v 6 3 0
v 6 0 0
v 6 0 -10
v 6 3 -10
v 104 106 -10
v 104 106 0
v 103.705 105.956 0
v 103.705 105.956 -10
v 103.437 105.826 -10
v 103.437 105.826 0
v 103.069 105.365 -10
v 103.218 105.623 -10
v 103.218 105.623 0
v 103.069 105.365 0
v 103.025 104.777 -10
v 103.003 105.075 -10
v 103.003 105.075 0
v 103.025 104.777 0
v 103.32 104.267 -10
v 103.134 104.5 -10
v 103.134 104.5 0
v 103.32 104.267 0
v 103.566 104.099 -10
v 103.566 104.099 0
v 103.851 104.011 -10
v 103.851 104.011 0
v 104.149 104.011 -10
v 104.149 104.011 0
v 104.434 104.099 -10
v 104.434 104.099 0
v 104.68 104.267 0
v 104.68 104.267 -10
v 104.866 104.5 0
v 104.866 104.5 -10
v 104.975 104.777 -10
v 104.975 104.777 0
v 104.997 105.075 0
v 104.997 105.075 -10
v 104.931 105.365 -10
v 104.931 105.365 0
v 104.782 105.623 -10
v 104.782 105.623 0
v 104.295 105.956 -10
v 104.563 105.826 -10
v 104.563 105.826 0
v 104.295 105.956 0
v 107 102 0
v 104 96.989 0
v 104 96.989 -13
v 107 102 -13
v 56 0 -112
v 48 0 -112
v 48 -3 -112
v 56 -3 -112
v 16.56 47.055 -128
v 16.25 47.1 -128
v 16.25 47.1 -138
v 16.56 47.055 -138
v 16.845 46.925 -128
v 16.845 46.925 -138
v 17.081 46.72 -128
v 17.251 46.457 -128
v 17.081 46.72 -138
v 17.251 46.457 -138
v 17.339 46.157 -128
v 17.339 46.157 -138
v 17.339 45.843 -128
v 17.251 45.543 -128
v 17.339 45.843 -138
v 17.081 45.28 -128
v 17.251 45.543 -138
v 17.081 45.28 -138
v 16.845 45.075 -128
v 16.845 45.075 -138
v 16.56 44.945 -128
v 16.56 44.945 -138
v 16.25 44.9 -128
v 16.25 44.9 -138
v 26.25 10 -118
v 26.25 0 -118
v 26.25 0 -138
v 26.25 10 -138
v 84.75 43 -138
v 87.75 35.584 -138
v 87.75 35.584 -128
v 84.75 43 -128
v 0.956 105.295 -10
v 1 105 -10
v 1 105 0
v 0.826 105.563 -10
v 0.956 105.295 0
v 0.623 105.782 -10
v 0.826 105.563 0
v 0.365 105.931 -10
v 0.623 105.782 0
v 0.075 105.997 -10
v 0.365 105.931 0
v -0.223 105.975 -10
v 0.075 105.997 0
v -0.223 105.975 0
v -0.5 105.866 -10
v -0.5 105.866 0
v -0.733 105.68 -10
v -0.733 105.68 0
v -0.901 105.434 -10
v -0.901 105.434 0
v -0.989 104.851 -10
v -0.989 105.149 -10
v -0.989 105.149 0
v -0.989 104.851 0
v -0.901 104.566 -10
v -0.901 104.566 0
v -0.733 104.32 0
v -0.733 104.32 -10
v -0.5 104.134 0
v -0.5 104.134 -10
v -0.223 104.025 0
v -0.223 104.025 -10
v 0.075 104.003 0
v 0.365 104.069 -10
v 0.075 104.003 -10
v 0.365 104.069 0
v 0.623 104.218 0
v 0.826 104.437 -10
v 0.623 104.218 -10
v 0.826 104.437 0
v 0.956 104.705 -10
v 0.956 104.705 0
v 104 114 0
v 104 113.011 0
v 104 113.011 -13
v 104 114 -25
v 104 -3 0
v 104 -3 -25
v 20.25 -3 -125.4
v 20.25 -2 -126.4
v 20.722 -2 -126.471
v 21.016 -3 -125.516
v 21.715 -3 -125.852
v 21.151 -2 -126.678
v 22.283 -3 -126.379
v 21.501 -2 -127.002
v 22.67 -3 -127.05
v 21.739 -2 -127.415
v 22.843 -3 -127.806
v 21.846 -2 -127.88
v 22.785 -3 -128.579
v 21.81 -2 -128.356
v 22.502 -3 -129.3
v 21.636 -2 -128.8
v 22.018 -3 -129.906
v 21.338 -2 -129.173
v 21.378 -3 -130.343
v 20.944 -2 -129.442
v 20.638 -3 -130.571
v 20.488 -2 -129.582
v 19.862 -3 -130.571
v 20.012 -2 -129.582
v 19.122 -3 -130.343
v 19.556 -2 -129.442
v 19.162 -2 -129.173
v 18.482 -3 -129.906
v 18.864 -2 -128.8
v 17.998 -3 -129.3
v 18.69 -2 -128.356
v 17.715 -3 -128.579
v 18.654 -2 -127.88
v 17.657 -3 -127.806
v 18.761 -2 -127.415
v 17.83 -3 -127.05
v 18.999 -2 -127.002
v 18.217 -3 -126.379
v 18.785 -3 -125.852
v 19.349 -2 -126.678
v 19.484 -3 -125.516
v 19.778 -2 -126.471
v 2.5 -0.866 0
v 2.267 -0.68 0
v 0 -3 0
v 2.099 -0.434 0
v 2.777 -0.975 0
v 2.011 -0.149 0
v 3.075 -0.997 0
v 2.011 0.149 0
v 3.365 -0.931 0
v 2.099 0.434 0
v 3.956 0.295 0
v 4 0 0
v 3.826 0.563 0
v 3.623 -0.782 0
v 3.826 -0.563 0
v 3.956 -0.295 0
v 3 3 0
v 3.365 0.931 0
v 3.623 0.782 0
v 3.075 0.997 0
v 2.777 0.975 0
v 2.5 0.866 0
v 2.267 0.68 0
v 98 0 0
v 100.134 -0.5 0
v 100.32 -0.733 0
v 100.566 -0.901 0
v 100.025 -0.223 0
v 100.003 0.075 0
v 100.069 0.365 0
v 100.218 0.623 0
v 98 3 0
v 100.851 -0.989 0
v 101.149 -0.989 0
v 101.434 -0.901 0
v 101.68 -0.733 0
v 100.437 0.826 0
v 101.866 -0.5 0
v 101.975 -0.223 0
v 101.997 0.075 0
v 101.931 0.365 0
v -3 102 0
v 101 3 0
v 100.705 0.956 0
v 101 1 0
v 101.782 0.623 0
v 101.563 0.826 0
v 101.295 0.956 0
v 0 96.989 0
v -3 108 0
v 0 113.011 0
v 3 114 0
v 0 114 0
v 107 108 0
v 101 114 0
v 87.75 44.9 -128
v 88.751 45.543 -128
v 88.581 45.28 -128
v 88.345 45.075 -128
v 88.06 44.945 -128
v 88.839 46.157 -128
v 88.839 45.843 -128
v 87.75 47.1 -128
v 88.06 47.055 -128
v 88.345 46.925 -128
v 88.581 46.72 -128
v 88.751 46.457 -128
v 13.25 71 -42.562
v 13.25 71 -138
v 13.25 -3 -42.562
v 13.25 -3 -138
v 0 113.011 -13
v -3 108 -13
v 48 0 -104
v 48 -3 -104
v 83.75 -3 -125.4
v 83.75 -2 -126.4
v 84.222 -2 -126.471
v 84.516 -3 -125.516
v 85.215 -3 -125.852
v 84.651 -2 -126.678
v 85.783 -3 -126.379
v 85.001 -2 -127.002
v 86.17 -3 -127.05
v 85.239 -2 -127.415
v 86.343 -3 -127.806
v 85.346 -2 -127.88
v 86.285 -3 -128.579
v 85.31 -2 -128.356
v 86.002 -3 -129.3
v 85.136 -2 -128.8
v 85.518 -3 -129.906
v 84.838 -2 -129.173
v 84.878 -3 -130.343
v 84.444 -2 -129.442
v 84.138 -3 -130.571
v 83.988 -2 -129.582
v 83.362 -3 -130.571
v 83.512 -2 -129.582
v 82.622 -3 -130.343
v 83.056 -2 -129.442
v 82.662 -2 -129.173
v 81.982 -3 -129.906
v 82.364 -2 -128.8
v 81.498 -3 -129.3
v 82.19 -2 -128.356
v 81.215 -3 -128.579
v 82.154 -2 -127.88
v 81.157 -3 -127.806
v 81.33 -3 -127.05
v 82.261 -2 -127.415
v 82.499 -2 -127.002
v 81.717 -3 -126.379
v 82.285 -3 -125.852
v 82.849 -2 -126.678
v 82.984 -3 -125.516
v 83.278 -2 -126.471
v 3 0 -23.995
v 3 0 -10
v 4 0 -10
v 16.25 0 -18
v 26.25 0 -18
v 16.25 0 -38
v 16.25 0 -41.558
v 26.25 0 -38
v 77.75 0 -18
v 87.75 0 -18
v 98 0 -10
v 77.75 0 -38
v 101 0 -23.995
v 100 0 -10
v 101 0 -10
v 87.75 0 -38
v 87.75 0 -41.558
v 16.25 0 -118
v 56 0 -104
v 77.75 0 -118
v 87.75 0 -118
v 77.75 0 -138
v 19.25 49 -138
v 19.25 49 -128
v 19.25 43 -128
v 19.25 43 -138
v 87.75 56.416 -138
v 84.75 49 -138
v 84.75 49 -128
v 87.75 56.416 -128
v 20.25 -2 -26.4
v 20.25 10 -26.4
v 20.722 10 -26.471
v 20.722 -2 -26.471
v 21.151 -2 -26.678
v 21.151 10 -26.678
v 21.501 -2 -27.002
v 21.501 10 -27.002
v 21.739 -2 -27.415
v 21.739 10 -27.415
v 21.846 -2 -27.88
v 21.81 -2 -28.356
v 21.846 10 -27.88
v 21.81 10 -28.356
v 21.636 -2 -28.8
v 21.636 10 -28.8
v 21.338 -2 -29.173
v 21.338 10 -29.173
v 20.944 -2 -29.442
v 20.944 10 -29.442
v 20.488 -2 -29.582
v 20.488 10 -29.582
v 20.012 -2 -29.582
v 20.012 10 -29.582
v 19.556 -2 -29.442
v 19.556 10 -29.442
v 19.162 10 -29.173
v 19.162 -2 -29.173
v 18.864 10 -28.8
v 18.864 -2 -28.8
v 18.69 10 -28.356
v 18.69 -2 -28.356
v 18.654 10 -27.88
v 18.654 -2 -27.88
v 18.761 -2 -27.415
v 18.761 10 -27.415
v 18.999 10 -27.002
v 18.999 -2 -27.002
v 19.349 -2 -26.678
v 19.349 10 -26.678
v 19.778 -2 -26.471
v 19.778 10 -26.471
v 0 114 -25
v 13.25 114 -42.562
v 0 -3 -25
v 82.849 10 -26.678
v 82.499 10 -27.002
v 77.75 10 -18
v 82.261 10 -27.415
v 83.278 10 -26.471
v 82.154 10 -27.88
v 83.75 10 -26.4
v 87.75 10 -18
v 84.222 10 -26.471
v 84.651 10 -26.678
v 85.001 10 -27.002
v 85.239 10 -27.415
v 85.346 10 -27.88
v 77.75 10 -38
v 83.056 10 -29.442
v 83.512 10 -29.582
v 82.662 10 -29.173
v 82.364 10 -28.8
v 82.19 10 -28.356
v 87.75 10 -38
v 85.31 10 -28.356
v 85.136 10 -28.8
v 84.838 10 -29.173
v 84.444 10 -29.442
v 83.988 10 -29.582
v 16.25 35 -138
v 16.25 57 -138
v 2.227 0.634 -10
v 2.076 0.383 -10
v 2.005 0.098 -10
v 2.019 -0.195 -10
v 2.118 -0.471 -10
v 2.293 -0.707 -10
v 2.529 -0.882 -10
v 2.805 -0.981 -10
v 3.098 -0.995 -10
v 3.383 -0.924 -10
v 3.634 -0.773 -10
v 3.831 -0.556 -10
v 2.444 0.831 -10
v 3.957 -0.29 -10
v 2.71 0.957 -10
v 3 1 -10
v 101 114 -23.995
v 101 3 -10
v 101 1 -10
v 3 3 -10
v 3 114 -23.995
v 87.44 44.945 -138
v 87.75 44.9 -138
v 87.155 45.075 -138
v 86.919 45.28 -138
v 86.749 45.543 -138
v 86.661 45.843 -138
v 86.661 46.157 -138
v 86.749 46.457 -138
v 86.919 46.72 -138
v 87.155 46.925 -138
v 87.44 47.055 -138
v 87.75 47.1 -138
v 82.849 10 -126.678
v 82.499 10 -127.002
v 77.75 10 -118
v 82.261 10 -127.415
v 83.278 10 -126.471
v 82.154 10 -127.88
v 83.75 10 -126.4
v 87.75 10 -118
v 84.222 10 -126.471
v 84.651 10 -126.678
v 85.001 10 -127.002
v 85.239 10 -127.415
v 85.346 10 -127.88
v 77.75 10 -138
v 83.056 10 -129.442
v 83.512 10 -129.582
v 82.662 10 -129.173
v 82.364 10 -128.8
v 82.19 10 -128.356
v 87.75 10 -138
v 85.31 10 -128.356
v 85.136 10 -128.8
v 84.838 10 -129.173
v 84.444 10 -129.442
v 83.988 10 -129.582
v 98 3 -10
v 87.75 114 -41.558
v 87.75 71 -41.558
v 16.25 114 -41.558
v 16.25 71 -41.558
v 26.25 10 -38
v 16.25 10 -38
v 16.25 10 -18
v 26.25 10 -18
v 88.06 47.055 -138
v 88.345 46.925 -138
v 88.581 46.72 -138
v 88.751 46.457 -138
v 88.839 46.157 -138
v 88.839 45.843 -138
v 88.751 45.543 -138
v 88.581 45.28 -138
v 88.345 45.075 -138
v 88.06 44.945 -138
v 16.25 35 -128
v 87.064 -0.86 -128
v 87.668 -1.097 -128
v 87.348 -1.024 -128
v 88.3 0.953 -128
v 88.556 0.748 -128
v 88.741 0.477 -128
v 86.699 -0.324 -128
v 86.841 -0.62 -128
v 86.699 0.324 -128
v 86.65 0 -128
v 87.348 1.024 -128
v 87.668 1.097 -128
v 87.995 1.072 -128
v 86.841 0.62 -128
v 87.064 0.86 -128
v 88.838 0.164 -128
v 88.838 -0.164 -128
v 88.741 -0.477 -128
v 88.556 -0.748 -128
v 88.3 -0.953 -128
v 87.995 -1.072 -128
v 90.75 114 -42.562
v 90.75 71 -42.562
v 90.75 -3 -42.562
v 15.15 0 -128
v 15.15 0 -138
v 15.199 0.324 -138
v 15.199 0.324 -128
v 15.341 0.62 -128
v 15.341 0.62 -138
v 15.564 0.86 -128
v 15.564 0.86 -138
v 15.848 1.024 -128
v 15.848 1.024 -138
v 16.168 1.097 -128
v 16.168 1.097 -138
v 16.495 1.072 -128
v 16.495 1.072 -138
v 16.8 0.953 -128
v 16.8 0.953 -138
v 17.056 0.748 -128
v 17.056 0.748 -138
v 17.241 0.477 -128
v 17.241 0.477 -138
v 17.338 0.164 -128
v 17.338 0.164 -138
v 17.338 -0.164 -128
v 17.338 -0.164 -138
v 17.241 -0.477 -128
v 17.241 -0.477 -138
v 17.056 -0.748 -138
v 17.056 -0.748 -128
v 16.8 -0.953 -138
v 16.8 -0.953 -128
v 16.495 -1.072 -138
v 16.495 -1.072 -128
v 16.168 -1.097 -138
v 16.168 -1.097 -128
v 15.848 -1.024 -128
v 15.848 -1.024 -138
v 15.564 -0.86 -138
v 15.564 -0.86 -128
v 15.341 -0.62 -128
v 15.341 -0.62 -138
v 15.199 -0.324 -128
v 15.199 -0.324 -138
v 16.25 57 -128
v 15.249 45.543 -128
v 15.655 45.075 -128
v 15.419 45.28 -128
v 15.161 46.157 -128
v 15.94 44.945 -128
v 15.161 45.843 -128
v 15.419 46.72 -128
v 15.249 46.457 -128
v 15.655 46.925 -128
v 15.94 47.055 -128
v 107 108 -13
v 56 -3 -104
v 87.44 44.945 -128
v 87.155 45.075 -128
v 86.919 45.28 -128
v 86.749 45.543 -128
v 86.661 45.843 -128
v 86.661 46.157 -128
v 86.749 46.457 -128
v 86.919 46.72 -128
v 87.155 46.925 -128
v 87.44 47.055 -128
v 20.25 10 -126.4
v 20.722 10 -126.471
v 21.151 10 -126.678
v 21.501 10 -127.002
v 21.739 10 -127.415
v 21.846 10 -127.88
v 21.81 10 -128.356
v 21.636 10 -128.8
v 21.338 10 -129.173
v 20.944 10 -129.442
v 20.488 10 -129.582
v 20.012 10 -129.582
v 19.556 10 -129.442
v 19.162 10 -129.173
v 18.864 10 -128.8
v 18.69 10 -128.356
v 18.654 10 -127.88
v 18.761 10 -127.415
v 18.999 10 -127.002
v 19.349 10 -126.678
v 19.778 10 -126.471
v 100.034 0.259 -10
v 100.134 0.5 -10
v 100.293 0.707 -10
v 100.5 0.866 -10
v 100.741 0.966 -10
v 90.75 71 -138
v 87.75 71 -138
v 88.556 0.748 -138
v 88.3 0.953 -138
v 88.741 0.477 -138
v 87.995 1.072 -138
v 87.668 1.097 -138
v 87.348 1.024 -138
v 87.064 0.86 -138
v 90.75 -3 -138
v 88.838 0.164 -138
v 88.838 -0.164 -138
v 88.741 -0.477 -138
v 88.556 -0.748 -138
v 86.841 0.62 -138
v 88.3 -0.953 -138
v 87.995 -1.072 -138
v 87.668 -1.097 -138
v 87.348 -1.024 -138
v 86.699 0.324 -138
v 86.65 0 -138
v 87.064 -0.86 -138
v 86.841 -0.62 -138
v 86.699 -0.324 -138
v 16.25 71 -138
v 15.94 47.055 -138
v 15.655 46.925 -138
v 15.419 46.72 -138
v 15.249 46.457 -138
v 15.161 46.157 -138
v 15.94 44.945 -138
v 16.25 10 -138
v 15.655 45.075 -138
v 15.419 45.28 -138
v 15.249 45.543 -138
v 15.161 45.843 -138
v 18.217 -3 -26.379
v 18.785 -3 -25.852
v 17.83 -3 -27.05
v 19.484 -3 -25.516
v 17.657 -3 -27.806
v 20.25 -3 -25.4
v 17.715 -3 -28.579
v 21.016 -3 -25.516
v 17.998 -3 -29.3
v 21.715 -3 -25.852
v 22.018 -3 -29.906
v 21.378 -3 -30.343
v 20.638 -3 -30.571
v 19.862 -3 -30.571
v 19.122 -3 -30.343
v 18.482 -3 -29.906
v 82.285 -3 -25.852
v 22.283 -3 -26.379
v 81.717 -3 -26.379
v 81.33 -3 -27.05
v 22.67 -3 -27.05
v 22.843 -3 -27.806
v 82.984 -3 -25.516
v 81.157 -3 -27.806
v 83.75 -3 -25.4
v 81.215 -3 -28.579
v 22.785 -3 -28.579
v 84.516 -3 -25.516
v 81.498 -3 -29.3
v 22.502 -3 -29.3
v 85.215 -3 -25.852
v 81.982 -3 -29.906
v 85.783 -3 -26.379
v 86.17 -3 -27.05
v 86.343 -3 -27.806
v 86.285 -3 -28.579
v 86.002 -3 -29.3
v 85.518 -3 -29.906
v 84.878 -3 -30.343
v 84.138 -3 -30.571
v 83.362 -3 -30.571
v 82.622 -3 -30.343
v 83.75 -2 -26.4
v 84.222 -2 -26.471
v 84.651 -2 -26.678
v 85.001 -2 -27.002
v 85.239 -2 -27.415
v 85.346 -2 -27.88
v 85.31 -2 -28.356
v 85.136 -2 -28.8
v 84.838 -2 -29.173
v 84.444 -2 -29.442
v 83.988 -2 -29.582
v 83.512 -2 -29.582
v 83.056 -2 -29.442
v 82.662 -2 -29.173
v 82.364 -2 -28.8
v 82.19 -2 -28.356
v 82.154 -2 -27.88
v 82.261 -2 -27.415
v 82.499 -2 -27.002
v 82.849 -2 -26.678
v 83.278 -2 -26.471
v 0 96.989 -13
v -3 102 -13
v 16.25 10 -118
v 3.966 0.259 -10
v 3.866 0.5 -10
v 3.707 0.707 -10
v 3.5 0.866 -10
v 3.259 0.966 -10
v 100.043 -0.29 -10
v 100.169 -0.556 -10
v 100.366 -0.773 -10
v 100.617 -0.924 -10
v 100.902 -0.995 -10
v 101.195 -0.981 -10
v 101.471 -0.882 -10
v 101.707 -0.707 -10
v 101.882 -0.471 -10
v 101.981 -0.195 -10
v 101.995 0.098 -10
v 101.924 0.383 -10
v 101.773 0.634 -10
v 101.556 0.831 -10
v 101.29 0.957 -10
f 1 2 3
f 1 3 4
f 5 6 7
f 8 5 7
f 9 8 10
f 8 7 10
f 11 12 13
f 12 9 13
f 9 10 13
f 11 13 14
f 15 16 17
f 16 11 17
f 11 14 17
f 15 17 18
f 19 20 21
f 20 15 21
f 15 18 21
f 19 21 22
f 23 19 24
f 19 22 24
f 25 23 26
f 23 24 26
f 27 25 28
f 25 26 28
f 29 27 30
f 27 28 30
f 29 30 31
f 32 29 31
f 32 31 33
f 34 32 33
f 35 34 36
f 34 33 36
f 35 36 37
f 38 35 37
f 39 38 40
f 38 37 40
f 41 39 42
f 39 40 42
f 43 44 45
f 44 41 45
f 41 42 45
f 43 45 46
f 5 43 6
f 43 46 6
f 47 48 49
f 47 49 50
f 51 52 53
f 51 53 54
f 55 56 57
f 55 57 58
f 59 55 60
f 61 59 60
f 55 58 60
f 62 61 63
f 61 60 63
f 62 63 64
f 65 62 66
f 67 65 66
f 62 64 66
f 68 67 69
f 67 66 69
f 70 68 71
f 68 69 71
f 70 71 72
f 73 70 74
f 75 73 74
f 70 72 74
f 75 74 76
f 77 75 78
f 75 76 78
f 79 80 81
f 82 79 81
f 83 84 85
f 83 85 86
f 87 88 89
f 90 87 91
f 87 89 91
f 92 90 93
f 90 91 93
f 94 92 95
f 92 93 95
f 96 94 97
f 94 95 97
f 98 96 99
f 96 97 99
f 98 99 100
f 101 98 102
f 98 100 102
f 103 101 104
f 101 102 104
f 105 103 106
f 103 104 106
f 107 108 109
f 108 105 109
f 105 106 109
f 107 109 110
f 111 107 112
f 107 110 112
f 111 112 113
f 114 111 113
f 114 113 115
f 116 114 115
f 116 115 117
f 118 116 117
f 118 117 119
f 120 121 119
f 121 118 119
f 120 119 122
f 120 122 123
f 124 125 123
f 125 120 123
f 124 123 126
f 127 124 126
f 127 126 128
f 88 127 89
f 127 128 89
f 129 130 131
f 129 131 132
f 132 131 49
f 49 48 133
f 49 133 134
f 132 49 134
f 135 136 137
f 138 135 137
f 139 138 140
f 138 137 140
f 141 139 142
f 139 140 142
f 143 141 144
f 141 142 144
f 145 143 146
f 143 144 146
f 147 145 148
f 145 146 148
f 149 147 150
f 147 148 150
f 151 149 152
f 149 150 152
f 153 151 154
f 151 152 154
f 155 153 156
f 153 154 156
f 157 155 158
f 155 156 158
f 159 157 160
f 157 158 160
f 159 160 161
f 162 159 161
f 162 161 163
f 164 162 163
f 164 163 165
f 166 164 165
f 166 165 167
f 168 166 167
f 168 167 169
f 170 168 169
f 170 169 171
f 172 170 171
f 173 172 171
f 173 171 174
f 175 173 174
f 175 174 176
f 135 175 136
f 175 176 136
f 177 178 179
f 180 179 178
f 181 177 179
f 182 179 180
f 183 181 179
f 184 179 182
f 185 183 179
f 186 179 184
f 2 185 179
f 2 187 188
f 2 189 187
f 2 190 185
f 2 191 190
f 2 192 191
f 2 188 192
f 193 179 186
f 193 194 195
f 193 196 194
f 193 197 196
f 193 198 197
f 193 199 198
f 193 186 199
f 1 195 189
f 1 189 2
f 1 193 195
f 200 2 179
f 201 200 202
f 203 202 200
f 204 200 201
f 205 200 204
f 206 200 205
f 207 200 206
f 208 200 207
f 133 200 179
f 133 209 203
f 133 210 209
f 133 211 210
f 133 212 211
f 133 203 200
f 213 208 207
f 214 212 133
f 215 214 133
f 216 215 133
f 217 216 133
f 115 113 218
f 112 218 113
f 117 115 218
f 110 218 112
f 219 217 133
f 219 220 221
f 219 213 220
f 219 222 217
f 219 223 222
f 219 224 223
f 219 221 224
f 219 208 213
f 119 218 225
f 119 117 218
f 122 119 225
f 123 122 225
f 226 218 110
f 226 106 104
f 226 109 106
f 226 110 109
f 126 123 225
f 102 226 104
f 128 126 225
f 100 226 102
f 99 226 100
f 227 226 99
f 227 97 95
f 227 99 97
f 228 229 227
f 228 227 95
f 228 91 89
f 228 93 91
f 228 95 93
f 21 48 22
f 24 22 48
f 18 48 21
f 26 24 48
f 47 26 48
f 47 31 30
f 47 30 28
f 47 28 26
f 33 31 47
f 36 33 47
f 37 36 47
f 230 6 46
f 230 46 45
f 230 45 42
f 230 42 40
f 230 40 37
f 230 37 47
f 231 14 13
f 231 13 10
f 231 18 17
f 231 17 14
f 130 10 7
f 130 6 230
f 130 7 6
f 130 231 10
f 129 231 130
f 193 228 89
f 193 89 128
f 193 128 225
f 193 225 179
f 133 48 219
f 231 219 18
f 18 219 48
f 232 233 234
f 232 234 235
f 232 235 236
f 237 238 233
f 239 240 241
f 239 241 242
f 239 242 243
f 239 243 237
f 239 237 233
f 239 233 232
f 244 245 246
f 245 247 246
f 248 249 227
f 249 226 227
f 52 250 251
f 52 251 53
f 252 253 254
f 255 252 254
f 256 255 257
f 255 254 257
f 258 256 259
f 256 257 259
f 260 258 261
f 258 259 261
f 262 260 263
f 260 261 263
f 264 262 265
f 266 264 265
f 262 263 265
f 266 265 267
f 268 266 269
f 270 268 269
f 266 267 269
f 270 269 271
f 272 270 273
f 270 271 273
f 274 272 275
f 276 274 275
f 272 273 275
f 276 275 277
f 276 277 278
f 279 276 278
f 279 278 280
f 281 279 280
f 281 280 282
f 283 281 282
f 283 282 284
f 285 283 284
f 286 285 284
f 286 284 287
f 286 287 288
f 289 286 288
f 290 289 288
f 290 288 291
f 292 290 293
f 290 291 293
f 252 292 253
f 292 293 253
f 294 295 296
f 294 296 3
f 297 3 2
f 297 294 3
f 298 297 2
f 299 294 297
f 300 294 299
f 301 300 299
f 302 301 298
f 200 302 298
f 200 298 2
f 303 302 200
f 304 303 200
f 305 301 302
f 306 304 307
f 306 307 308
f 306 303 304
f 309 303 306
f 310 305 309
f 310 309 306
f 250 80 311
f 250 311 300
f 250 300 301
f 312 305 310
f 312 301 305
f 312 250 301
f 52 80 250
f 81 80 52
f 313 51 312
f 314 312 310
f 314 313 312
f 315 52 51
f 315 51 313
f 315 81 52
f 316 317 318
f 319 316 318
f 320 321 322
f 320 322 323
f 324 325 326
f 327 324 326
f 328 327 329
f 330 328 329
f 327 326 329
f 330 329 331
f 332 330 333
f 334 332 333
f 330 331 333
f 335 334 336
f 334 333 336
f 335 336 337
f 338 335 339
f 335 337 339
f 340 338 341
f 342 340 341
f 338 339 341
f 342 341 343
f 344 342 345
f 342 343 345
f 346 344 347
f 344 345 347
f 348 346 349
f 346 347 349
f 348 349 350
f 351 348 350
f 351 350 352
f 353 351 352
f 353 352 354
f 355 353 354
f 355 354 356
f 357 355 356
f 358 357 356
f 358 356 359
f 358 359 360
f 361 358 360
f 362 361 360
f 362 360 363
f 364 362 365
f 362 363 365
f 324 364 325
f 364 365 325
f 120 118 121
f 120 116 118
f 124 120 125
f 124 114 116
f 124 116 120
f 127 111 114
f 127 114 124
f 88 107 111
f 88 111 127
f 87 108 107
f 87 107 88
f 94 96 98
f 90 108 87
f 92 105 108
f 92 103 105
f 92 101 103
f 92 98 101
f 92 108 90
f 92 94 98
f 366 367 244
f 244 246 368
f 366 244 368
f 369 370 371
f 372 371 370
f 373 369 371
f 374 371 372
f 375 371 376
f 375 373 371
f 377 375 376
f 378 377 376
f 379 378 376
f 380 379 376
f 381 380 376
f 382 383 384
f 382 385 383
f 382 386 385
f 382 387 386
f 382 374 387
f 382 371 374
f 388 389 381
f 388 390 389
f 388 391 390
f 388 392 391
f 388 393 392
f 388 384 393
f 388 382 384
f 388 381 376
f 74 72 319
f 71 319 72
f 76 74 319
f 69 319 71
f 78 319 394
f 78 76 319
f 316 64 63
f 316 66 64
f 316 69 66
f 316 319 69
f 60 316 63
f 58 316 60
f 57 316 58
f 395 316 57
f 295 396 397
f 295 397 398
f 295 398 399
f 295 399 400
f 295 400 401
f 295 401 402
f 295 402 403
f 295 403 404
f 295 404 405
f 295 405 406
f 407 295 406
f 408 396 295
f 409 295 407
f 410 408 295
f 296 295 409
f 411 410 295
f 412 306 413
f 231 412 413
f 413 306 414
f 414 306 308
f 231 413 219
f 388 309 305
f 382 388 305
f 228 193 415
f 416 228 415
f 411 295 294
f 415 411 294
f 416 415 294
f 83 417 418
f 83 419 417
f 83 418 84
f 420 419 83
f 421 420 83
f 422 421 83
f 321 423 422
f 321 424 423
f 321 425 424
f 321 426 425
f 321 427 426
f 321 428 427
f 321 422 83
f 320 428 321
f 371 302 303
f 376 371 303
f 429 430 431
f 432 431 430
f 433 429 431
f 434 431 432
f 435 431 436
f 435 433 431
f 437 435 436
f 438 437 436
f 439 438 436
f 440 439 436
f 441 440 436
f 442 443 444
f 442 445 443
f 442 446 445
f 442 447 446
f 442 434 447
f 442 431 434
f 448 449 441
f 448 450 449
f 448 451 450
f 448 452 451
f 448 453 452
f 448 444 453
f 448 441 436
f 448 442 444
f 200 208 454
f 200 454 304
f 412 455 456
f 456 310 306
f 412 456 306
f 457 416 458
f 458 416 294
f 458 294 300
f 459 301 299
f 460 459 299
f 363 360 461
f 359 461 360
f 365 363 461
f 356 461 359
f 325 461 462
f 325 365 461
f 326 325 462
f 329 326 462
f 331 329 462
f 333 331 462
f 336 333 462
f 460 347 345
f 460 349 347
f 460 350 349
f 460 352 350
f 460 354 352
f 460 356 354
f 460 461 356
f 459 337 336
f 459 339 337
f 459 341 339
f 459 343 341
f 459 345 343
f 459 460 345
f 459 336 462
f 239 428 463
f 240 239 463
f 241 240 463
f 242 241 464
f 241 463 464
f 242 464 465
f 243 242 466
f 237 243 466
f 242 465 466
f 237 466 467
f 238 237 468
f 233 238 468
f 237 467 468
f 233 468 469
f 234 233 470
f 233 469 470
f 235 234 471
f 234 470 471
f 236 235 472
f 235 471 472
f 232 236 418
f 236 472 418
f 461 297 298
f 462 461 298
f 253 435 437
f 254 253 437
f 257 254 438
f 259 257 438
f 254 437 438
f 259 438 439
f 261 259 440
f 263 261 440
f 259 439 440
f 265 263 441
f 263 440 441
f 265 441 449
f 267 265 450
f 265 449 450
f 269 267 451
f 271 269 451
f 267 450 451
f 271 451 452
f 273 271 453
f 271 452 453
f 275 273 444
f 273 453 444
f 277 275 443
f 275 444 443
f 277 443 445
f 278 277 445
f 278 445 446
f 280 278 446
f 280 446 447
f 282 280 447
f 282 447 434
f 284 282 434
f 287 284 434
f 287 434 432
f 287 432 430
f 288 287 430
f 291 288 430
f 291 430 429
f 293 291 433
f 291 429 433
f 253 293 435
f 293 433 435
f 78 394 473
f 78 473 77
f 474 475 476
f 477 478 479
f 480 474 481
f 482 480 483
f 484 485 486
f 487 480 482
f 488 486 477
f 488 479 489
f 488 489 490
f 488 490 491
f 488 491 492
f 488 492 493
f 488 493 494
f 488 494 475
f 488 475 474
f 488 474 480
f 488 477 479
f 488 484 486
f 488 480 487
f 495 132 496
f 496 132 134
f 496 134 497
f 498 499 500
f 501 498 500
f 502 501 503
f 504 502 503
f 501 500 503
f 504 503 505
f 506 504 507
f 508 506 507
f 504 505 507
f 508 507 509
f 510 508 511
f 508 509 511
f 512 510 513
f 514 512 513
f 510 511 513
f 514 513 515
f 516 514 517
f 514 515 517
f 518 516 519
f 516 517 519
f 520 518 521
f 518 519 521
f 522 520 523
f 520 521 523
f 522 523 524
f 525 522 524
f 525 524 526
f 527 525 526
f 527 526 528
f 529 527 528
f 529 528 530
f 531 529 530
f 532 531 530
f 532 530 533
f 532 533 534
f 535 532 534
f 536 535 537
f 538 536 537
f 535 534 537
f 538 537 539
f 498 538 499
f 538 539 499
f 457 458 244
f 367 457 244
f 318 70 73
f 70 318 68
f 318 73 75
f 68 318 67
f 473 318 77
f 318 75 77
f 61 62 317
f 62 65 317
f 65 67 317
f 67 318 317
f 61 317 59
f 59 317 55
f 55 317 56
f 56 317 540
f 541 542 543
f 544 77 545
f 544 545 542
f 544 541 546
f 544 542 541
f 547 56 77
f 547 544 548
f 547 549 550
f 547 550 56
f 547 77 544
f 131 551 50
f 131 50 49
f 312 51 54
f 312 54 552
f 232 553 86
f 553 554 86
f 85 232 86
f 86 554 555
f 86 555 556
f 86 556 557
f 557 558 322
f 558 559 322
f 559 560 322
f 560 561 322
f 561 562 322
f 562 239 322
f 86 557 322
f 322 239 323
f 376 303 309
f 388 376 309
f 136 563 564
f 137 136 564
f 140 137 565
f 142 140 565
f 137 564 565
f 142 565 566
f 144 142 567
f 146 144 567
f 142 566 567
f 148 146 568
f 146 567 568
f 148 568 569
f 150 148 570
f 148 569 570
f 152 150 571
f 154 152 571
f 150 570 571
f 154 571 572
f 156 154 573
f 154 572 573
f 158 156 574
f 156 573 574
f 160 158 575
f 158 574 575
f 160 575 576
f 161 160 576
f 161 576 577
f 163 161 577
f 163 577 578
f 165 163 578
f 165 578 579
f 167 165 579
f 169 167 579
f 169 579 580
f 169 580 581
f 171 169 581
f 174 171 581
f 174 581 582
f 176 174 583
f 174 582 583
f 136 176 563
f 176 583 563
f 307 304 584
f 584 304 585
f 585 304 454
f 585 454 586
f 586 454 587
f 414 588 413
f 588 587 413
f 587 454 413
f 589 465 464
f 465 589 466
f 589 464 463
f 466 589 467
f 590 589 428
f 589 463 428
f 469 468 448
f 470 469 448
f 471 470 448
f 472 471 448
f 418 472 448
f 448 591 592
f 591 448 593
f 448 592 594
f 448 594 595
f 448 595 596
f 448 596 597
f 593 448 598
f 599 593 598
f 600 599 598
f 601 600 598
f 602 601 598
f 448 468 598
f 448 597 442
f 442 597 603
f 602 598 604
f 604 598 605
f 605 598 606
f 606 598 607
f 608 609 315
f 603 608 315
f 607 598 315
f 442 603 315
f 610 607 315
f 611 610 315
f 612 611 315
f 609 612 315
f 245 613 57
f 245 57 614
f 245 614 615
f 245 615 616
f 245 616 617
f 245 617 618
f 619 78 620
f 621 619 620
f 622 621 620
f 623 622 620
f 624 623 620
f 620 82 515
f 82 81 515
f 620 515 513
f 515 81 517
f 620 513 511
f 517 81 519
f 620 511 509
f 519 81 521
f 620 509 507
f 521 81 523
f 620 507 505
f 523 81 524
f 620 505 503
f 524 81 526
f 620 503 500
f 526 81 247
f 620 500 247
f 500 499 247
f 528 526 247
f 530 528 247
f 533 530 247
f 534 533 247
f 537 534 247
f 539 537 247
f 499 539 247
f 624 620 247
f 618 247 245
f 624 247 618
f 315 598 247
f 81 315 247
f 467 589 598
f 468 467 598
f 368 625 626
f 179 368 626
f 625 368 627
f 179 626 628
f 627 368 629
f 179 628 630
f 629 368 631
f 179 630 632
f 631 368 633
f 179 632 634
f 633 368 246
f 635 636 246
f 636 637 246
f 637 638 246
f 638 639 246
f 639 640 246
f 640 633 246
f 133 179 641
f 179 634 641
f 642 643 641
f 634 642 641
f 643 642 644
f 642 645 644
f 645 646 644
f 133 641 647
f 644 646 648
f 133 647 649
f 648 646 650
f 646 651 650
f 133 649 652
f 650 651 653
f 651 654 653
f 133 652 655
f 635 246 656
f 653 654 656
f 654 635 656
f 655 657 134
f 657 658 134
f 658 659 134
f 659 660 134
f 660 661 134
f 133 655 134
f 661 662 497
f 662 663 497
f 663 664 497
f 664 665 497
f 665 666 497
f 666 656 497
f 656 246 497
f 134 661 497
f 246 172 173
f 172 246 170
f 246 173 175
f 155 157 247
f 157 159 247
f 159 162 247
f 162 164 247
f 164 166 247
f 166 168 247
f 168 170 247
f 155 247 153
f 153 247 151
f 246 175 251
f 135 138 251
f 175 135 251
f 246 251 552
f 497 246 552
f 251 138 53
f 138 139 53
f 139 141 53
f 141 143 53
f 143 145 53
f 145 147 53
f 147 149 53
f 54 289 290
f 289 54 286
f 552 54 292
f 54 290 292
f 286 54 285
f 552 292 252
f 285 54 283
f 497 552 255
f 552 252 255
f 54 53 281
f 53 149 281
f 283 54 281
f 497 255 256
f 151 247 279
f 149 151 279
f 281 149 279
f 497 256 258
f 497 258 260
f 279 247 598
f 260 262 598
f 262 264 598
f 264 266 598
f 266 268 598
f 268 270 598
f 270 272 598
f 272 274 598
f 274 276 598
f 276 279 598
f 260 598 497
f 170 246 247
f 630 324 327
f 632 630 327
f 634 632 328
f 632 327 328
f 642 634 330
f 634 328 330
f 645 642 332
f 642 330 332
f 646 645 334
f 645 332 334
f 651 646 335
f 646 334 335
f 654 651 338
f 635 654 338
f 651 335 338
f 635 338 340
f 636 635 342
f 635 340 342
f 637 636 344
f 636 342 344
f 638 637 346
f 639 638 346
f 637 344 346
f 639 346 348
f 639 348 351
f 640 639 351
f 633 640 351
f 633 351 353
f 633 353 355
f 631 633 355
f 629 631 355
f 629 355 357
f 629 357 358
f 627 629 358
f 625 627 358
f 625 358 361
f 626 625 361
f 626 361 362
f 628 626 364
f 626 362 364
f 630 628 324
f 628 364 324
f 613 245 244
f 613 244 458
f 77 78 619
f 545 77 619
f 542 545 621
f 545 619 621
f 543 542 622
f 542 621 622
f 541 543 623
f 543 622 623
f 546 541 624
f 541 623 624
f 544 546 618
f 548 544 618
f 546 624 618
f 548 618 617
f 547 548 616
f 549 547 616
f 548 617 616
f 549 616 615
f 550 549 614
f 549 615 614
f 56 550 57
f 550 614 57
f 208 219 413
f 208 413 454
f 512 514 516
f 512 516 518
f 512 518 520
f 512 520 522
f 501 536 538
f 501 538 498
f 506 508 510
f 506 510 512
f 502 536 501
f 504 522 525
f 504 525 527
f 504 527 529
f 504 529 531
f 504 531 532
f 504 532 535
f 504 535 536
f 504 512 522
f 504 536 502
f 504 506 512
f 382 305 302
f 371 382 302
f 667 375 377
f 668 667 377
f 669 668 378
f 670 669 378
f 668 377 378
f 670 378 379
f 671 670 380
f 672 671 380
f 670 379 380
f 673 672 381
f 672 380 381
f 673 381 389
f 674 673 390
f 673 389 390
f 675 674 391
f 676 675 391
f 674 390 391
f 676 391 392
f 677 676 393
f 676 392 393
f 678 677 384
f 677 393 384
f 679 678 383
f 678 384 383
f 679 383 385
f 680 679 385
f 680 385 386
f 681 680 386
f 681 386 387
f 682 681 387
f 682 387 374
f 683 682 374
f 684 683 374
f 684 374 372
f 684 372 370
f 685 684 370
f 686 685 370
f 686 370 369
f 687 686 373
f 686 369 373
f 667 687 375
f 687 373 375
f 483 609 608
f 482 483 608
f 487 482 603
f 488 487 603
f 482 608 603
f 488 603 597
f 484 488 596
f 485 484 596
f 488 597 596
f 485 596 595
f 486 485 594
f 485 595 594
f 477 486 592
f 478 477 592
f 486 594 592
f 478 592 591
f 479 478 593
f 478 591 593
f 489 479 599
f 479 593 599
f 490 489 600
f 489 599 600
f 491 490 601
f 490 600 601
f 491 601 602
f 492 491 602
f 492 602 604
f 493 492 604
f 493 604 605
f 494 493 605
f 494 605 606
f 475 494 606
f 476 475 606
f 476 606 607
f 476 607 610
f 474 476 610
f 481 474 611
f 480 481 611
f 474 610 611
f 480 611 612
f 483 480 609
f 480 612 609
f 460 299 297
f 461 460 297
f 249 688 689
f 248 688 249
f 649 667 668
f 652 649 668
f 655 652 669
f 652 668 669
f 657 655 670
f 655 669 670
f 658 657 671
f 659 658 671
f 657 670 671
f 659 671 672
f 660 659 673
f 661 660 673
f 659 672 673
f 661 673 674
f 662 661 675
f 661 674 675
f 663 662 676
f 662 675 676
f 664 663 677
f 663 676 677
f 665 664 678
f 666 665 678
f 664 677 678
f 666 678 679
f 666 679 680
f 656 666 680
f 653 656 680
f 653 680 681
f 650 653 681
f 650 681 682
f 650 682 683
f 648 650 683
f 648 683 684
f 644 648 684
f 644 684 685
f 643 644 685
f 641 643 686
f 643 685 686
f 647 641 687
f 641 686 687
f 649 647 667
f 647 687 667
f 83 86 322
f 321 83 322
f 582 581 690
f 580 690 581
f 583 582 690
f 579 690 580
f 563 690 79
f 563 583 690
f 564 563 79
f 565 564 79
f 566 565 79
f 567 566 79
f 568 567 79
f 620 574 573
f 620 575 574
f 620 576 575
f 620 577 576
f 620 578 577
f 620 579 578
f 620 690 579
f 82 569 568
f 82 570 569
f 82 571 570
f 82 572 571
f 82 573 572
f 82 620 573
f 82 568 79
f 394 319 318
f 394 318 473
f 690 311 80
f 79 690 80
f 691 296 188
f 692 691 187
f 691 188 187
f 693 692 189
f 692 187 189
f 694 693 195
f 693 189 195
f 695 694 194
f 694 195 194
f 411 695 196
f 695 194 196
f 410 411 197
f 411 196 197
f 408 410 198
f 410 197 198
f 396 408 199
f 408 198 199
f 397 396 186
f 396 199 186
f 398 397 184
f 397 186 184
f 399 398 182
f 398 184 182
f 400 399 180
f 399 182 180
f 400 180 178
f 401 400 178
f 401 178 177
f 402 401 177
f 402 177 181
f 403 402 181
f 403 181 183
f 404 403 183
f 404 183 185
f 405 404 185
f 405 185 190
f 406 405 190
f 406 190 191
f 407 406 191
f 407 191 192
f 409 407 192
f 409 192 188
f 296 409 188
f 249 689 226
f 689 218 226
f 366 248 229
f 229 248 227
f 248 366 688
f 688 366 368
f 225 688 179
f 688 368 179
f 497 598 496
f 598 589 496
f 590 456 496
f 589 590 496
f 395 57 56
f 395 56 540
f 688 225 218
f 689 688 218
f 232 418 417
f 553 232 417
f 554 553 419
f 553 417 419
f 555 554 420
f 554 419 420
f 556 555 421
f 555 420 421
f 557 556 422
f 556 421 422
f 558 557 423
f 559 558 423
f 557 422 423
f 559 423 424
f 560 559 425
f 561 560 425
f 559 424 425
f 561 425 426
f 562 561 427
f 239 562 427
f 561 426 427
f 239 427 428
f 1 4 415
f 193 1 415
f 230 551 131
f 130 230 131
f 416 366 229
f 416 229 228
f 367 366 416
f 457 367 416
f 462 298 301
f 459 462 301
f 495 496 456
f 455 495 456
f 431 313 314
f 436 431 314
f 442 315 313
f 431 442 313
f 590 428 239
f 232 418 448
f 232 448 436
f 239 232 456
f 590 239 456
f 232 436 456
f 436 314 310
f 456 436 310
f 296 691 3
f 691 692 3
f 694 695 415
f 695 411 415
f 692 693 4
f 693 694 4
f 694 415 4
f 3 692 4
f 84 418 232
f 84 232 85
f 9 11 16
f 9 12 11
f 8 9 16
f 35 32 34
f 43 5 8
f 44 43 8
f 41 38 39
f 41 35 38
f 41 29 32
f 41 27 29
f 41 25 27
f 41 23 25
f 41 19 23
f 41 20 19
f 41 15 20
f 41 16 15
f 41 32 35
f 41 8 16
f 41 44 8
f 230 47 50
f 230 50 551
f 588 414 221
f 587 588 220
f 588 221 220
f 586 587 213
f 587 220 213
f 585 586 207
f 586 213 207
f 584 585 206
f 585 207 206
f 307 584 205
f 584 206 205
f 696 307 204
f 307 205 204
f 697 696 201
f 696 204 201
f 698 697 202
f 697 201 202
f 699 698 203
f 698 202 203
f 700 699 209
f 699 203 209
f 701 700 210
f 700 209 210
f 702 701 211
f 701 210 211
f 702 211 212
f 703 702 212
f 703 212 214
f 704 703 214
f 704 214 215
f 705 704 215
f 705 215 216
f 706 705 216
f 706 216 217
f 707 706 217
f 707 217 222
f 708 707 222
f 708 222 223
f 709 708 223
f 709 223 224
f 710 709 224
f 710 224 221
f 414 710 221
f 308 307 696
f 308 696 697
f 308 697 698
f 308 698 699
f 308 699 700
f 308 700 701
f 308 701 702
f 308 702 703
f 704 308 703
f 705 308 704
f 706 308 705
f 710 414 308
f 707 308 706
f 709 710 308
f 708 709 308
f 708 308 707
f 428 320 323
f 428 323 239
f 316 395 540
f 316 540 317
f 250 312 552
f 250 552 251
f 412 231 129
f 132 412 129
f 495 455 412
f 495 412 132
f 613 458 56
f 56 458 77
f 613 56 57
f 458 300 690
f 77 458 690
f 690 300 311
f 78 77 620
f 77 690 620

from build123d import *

# Parameters (mm, degrees)
DODANIE_WYCI_GNI_CIE1_DEPTH   = 3
DODANIE_WYCI_GNI_CIE2_DEPTH   = 71
DODANIE_WYCI_GNI_CIE4_DEPTH   = 43
DODANIE_WYCI_GNI_CIE5_DEPTH   = 10
DODANIE_WYCI_GNI_CIE6_DEPTH   = 10
DODANIE_WYCI_GNI_CIE6_2_DEPTH = 10
DODANIE_WYCI_GNI_CIE7_DEPTH   = 10
SZKIC4_5_R                    = 0.9999999999999987
WYTNIJ_WYCI_GNI_CIE1_DEPTH    = 10
SZKIC3_3_R                    = 1.100000000000006
SZKIC3_3_R_2                  = 1.100000000000001
WYTNIJ_WYCI_GNI_CIE2_DEPTH    = 10
DODANIE_WYCI_GNI_CIE11_DEPTH  = 3
SZKIC12_R                     = 1.6000000000000019
SZKIC12_R_2                   = 1.600000000000005
SZKIC12_R_3                   = 1.5999999999999988
SZKIC12_R_4                   = 1.600000000000002
WYTNIJ_WYCI_GNI_CIE3_DEPTH    = 13
SFAZOWANIE2_SIZE              = 1


with BuildPart() as part:
    # Szkic1 → Dodanie-wyciągnięcie1 (new body)
    # profile 1 of 9: a face of its own
    with BuildSketch(Plane(origin=(0, 0, 0), x_dir=(1, 0, 0), z_dir=(0, 1, 0))):
        Polygon((16.250000000000007, 138), (16.25000000000002, 41.557646628857135), (3.0000000000000027, 23.99525783917362), (3.0000000000000027, 0), (0, 0), (0, 25), (13.25, 42.56238878968349), (13.249999999999977, 138), align=None)
    # profile 2 of 9: a face of its own
    with BuildSketch(Plane(origin=(0, 0, 0), x_dir=(1, 0, 0), z_dir=(0, 1, 0))):
        Polygon((16.250000000000007, 138), (16.25000000000001, 118.00000000000001), (22.250000000000018, 118.00000000000001), (26.250000000000014, 118.00000000000001), (26.25000000000001, 138), align=None)
    # profile 3 of 9: a face of its own
    with BuildSketch(Plane(origin=(0, 0, 0), x_dir=(1, 0, 0), z_dir=(0, 1, 0))):
        Polygon((16.25000000000001, 118.00000000000001), (16.25000000000002, 41.55764662885713), (16.25000000000002, 38.00000000000002), (22.250000000000018, 38.00000000000002), (22.250000000000018, 118.00000000000003), align=None)
    # profile 4 of 9: a face of its own
    with BuildSketch(Plane(origin=(0, 0, 0), x_dir=(1, 0, 0), z_dir=(0, 1, 0))):
        Polygon((3.0000000000000027, 23.99525783917362), (3.0000000000000027, 0), (100.99999999999996, 2.329e-14), (100.99999999999997, 23.99525783917362), (87.74999999999994, 41.557646628857135), (87.74999999999994, 38.00000000000002), (87.74999999999991, 18.000000000000014), (77.74999999999991, 18.00000000000002), (77.74999999999991, 38.00000000000003), (81.74999999999991, 38.00000000000002), (81.7499999999999, 118.00000000000003), (77.74999999999991, 118.00000000000001), (77.74999999999991, 138), (26.25000000000001, 138), (26.250000000000014, 118.00000000000001), (22.250000000000018, 118.00000000000001), (22.250000000000018, 38.00000000000002), (26.250000000000025, 38.00000000000002), (26.250000000000025, 18.000000000000014), (16.25000000000002, 18.000000000000014), (16.25000000000002, 38.00000000000002), (16.25000000000002, 41.557646628857135), align=None)
        Polygon((48, 112.00000000000001), (55.99999999999997, 112), (55.999999999999964, 104.00000000000001), (48, 104.00000000000001), align=None, mode=Mode.SUBTRACT)
    # profile 5 of 9: a face of its own
    with BuildSketch(Plane(origin=(0, 0, 0), x_dir=(1, 0, 0), z_dir=(0, 1, 0))):
        Polygon((81.7499999999999, 118.00000000000001), (87.74999999999991, 118.00000000000003), (87.74999999999994, 138), (77.74999999999991, 138), (77.74999999999991, 118.00000000000001), align=None)
    # profile 6 of 9: a face of its own
    with BuildSketch(Plane(origin=(0, 0, 0), x_dir=(1, 0, 0), z_dir=(0, 1, 0))):
        Polygon((87.74999999999994, 38.00000000000002), (87.74999999999994, 41.557646628857135), (87.74999999999994, 118.00000000000003), (81.7499999999999, 118.00000000000001), (81.74999999999991, 38.00000000000003), align=None)
    # profile 7 of 9: a face of its own
    with BuildSketch(Plane(origin=(0, 0, 0), x_dir=(1, 0, 0), z_dir=(0, 1, 0))):
        Polygon((87.74999999999994, 138), (90.74999999999996, 137.9999999999999), (90.74999999999997, 42.56238878968349), (103.99999999999996, 25), (103.99999999999999, 2.4e-14), (100.99999999999996, 0), (100.99999999999997, 23.99525783917362), (87.74999999999994, 41.557646628857135), align=None)
    # profile 8 of 9: a face of its own
    with BuildSketch(Plane(origin=(0, 0, 0), x_dir=(1, 0, 0), z_dir=(0, 1, 0))):
        Polygon((22.250000000000018, 38.00000000000002), (16.250000000000018, 38.00000000000002), (16.25000000000002, 18.000000000000014), (26.250000000000025, 18.000000000000014), (26.250000000000025, 38.00000000000002), align=None)
    # profile 9 of 9: a face of its own
    with BuildSketch(Plane(origin=(0, 0, 0), x_dir=(1, 0, 0), z_dir=(0, 1, 0))):
        Polygon((87.74999999999991, 18.000000000000014), (87.74999999999994, 38.00000000000002), (81.74999999999991, 38.00000000000002), (77.74999999999991, 38.00000000000003), (77.74999999999991, 18.00000000000002), align=None)
    extrude(amount=-DODANIE_WYCI_GNI_CIE1_DEPTH)

    # Szkic1<3> → Dodanie-wyciągnięcie2 (add)
    with BuildSketch(Plane(origin=(0, 0, 0), x_dir=(1, 0, 0), z_dir=(0, 1, 0))):
        Polygon((0, 0), (3.0000000000000027, 0), (3.0000000000000027, 23.99525783917362), (16.25000000000002, 41.557646628857135), (16.250000000000007, 138), (13.249999999999977, 138), (13.25, 42.562388789683496), (0, 25), align=None)
        Polygon((100.99999999999997, 23.99525783917362), (100.99999999999996, 0), (103.99999999999999, 2.4e-14), (103.99999999999996, 25), (90.74999999999997, 42.56238878968349), (90.74999999999996, 137.9999999999999), (87.74999999999994, 138), (87.74999999999994, 41.55764662885713), align=None)
    extrude(amount=DODANIE_WYCI_GNI_CIE2_DEPTH)

    # Szkic2 → Dodanie-wyciągnięcie4 (add)
    with BuildSketch(Plane(origin=(0, 71, 0), x_dir=(1, 0, 0), z_dir=(0, 1, 0))):
        Polygon((90.74999999999997, 42.56238878968349), (87.74999999999994, 41.557646628857135), (100.99999999999996, 23.995257839173625), (100.99999999999996, 0), (103.99999999999999, 2.4e-14), (103.99999999999997, 25), align=None)
        Polygon((16.25000000000002, 41.557646628857135), (13.25, 42.56238878968349), (-5.33e-15, 25), (0, 0), (3.0000000000000027, 0), (3.0000000000000027, 23.99525783917362), align=None)
    extrude(amount=DODANIE_WYCI_GNI_CIE4_DEPTH)

    # Szkic1<5> → Dodanie-wyciągnięcie5 (add)
    with BuildSketch(Plane(origin=(0, 0, 0), x_dir=(1, 0, 0), z_dir=(0, 1, 0))):
        Polygon((22.250000000000018, 38.00000000000002), (16.250000000000018, 38.00000000000002), (16.25000000000002, 18.000000000000014), (26.250000000000025, 18.000000000000014), (26.250000000000025, 38.00000000000002), align=None)
        Polygon((87.74999999999991, 18.000000000000014), (87.74999999999994, 38.00000000000002), (81.74999999999991, 38.00000000000002), (77.74999999999991, 38.00000000000003), (77.74999999999991, 18.00000000000002), align=None)
        Polygon((16.250000000000007, 138), (16.25000000000001, 118.00000000000001), (22.250000000000018, 118.00000000000001), (26.250000000000014, 118.00000000000001), (26.25000000000001, 138), align=None)
        Polygon((81.7499999999999, 118.00000000000001), (87.74999999999991, 118.00000000000003), (87.74999999999994, 138), (77.74999999999991, 138), (77.74999999999991, 118.00000000000001), align=None)
    extrude(amount=DODANIE_WYCI_GNI_CIE5_DEPTH)

    # Szkic4 → Dodanie-wyciągnięcie7 (add)
    with BuildSketch(Plane.XY):
        Polygon((0, 113.01054887212972), (-3.0000000000000027, 108.00000000000004), (-3.0000000000000027, 102.00000000000001), (0, 96.98945112787034), align=None)
        Polygon((5.999999999999927, 2.9999999999999756), (3.0000000000000027, 2.9999999999999813), (3.0000000000000027, 0), (5.999999999999928, 0), align=None)
        Polygon((97.99999999999994, 2.9999999999999756), (97.99999999999994, 0), (100.99999999999996, 0), (100.99999999999996, 2.9999999999999836), align=None)
        with BuildLine():
            Line((103.99999999999989, 96.98945112787034), (106.99999999999987, 102.00000000000001))
            Line((106.99999999999987, 102.00000000000001), (106.99999999999987, 108.00000000000004))
            Line((106.99999999999987, 108.00000000000004), (103.99999999999989, 113.01054887212972))
            Line((103.99999999999989, 113.01054887212972), (103.99999999999996, 106.00000000000004))
            ThreePointArc((103.99999999999996, 106.00000000000004), (104.99999999999986, 105.00000000000004), (103.99999999999996, 104.00000000000004))
            Line((103.99999999999996, 104.00000000000004), (103.99999999999989, 96.98945112787034))
        make_face()
    extrude(amount=-DODANIE_WYCI_GNI_CIE7_DEPTH)

    # Szkic4<5> → Wytnij-wyciągnięcie1 (cut)
    with BuildSketch(Plane.XY):
        with BuildLine():
            Line((3.0000000000000027, 0), (3.0000000000000027, 0.9999999999999849))
            ThreePointArc((3.00000000000002, 0.9999999999999849), (2.2928932188133495, -0.7071067811865266), (3.999999999999926, -1.326e-14))
            Line((3.999999999999929, 0), (3, 0))
        make_face()
        with BuildLine():
            ThreePointArc((3.999999999999926, -1.301e-14), (3.7071067811865066, 0.7071067811865006), (3.00000000000002, 0.9999999999999849))
            Line((3.0000000000000027, 0.9999999999999849), (3.0000000000000027, 0))
            Line((3, 0), (3.999999999999929, 0))
        make_face()
        with BuildLine():
            Line((3.0000000000000027, 0), (3.0000000000000027, 0.9999999999999849))
            ThreePointArc((3.00000000000002, 0.9999999999999849), (2.2928932188133495, -0.7071067811865266), (3.999999999999926, -1.326e-14))
            Line((3.999999999999929, 0), (3, 0))
        make_face()
        with BuildLine():
            ThreePointArc((3.999999999999926, -1.301e-14), (3.7071067811865066, 0.7071067811865006), (3.00000000000002, 0.9999999999999849))
            Line((3.0000000000000027, 0.9999999999999849), (3.0000000000000027, 0))
            Line((3, 0), (3.999999999999929, 0))
        make_face()
        with BuildLine():
            Line((100.99999999999996, 0), (99.99999999999997, 0))
            ThreePointArc((99.99999999999997, -1.289e-14), (100.99999999999997, -1.0000000000000113), (101.99999999999997, -1.326e-14))
            ThreePointArc((101.99999999999997, -1.301e-14), (101.70710678118652, 0.7071067811865333), (100.99999999999997, 0.9999999999999853))
            Line((100.99999999999996, 0.9999999999999858), (100.99999999999996, 0))
        make_face()
        with BuildLine():
            ThreePointArc((100.99999999999997, 0.9999999999999853), (100.29289321881342, 0.7071067811865334), (99.99999999999997, -1.289e-14))
            Line((99.99999999999997, 0), (100.99999999999996, 0))
            Line((100.99999999999996, 0), (100.99999999999996, 0.9999999999999858))
        make_face()
        with BuildLine():
            Line((100.99999999999996, 0), (99.99999999999997, 0))
            ThreePointArc((99.99999999999997, -1.289e-14), (100.99999999999997, -1.0000000000000113), (101.99999999999997, -1.326e-14))
            ThreePointArc((101.99999999999997, -1.301e-14), (101.70710678118652, 0.7071067811865333), (100.99999999999997, 0.9999999999999853))
            Line((100.99999999999996, 0.9999999999999858), (100.99999999999996, 0))
        make_face()
        with BuildLine():
            ThreePointArc((100.99999999999997, 0.9999999999999853), (100.29289321881342, 0.7071067811865334), (99.99999999999997, -1.289e-14))
            Line((99.99999999999997, 0), (100.99999999999996, 0))
            Line((100.99999999999996, 0), (100.99999999999996, 0.9999999999999858))
        make_face()
        with BuildLine():
            Line((103.99999999999999, 106.00000000000004), (103.99999999999999, 104.00000000000004))
            ThreePointArc((103.99999999999996, 104.00000000000004), (104.70710678118644, 104.29289321881353), (104.99999999999986, 105.00000000000004))
            ThreePointArc((104.99999999999986, 105.00000000000004), (104.70710678118644, 105.70710678118655), (103.99999999999996, 106.00000000000004))
        make_face()
        with BuildLine():
            ThreePointArc((103.99999999999996, 106.00000000000004), (102.99999999999986, 105.00000000000004), (103.99999999999996, 104.00000000000004))
            Line((103.99999999999999, 104.00000000000004), (103.99999999999999, 106.00000000000004))
        make_face()
        with Locations((0, 105.00000000000003)):
            Circle(SZKIC4_5_R)
    extrude(amount=-WYTNIJ_WYCI_GNI_CIE1_DEPTH, mode=Mode.SUBTRACT)


with BuildPart() as body_2:
    # Szkic3 → Dodanie-wyciągnięcie6 (new body)
    with BuildSketch(Plane(origin=(0, 0, -138), x_dir=(-1, 0, 0), z_dir=(0, 0, -1))):
        Polygon((-87.74999999999997, 56.41619848709567), (-87.74999999999996, 35.583801512904344), (-84.74999999999996, 43), (-84.74999999999996, 49.00000000000001), align=None)
    extrude(amount=-DODANIE_WYCI_GNI_CIE6_DEPTH)


with BuildPart() as body_3:
    # Szkic3 → Dodanie-wyci_gni_cie6 2 (new body)
    with BuildSketch(Plane(origin=(0, 0, -138), x_dir=(-1, 0, 0), z_dir=(0, 0, -1))):
        Polygon((-16.250000000000004, 35), (-16.250000000000007, 57.000000000000014), (-19.24999999999999, 49.00000000000001), (-19.250000000000004, 43), align=None)
    extrude(amount=-DODANIE_WYCI_GNI_CIE6_2_DEPTH)


with BuildPart() as wytnij_wyci_gni_cie2_tool:
    # Szkic3<3> → Wytnij-wyciągnięcie2 (new body)
    with BuildSketch(Plane(origin=(0, 0, -138), x_dir=(-1, 0, 0), z_dir=(0, 0, -1))):
        with BuildLine():
            Line((-87.74999999999994, 44.9), (-87.74999999999994, 47.100000000000016))
            ThreePointArc((-87.74999999999997, 47.100000000000016), (-88.84999999999997, 46.00000000000001), (-87.74999999999997, 44.9))
        make_face()
        with BuildLine():
            ThreePointArc((-86.64999999999995, 46.00000000000001), (-86.97218254069476, 46.77781745930522), (-87.74999999999997, 47.100000000000016))
            Line((-87.74999999999994, 47.100000000000016), (-87.74999999999994, 44.9))
            ThreePointArc((-87.74999999999997, 44.9), (-86.97218254069476, 45.222182540694796), (-86.64999999999995, 46.00000000000001))
        make_face()
        with BuildLine():
            Line((-87.74999999999994, 44.9), (-87.74999999999994, 47.100000000000016))
            ThreePointArc((-87.74999999999997, 47.100000000000016), (-88.84999999999997, 46.00000000000001), (-87.74999999999997, 44.9))
        make_face()
        with BuildLine():
            ThreePointArc((-86.64999999999995, 46.00000000000001), (-86.97218254069476, 46.77781745930522), (-87.74999999999997, 47.100000000000016))
            Line((-87.74999999999994, 47.100000000000016), (-87.74999999999994, 44.9))
            ThreePointArc((-87.74999999999997, 44.9), (-86.97218254069476, 45.222182540694796), (-86.64999999999995, 46.00000000000001))
        make_face()
        with BuildLine():
            Line((-16.250000000000007, 44.900000000000006), (-16.250000000000007, 47.10000000000001))
            ThreePointArc((-16.250000000000032, 47.10000000000001), (-17.35, 46.00000000000001), (-16.25000000000003, 44.900000000000006))
        make_face()
        with BuildLine():
            ThreePointArc((-15.15, 46.00000000000001), (-15.47218254069481, 46.77781745930522), (-16.250000000000032, 47.10000000000001))
            Line((-16.250000000000007, 47.10000000000001), (-16.250000000000007, 44.900000000000006))
            ThreePointArc((-16.25000000000003, 44.900000000000006), (-15.472182540694808, 45.222182540694796), (-15.15, 46.00000000000001))
        make_face()
        with BuildLine():
            Line((-16.250000000000007, 44.900000000000006), (-16.250000000000007, 47.10000000000001))
            ThreePointArc((-16.250000000000032, 47.10000000000001), (-17.35, 46.00000000000001), (-16.25000000000003, 44.900000000000006))
        make_face()
        with BuildLine():
            ThreePointArc((-15.15, 46.00000000000001), (-15.47218254069481, 46.77781745930522), (-16.250000000000032, 47.10000000000001))
            Line((-16.250000000000007, 47.10000000000001), (-16.250000000000007, 44.900000000000006))
            ThreePointArc((-16.25000000000003, 44.900000000000006), (-15.472182540694808, 45.222182540694796), (-15.15, 46.00000000000001))
        make_face()
        with Locations((-87.74999999999997, 0)):
            Circle(SZKIC3_3_R)
        with Locations((-16.249999999999986, 0)):
            Circle(SZKIC3_3_R_2)
    extrude(amount=-WYTNIJ_WYCI_GNI_CIE2_DEPTH)


with BuildPart() as part_1:
    add(part.part)

    # Wytnij-wyciągnięcie2: cut by wytnij_wyci_gni_cie2_tool
    add(wytnij_wyci_gni_cie2_tool.part, mode=Mode.SUBTRACT)

    # Szkic11 → Dodanie-wyciągnięcie11 (add)
    with BuildSketch(Plane(origin=(0, 0, -10), x_dir=(-1, 0, 0), z_dir=(0, 0, -1))):
        Polygon((0, 113.01054887212972), (0, 106.00000000000003), (0, 104.00000000000003), (0, 96.98945112787035), (3.0000000000000027, 102.00000000000001), (3.0000000000000027, 108.00000000000004), align=None)
        Polygon((-103.99999999999999, 106.00000000000004), (-103.99999999999999, 113.01054887212958), (-106.99999999999987, 108.00000000000004), (-106.99999999999987, 102.00000000000001), (-103.99999999999999, 96.98945112787047), (-103.99999999999999, 104.00000000000004), align=None)
    extrude(amount=DODANIE_WYCI_GNI_CIE11_DEPTH)

    # Szkic12 → Wytnij-wyciągnięcie3 (cut)
    with BuildSketch(Plane(origin=(0, 10, 0), x_dir=(1, 0, 0), z_dir=(0, 1, 0))):
        with Locations(Location((20.25000000000002, 28.000000000000025, 0), (0, 0, 270))):
            Circle(SZKIC12_R)
        with Locations(Location((83.74999999999993, 28.00000000000004, 0), (0, 0, 270))):
            Circle(SZKIC12_R_2)
        with Locations(Location((20.250000000000007, 128, 0), (0, 0, 270))):
            Circle(SZKIC12_R_3)
        with Locations(Location((83.74999999999991, 128, 0), (0, 0, 270))):
            Circle(SZKIC12_R_4)
    extrude(amount=-WYTNIJ_WYCI_GNI_CIE3_DEPTH, mode=Mode.SUBTRACT)

    # Sfazowanie2
    sfazowanie2_edges = [part_1.edges().sort_by_distance(p)[0] for p in [
        (83.74999999999993, -3, -29.600000000000044),
        (20.250000000000007, -3, -129.6),
        (83.74999999999991, -3, -129.6),
        (20.25000000000002, -3, -29.600000000000026),
    ]]
    chamfer(sfazowanie2_edges, length=SFAZOWANIE2_SIZE)


with BuildPart() as body_2_1:
    add(body_2.part)

    # Wytnij-wyciągnięcie2: cut by wytnij_wyci_gni_cie2_tool
    add(wytnij_wyci_gni_cie2_tool.part, mode=Mode.SUBTRACT)


with BuildPart() as body_3_1:
    add(body_3.part)

    # Wytnij-wyciągnięcie2: cut by wytnij_wyci_gni_cie2_tool
    add(wytnij_wyci_gni_cie2_tool.part, mode=Mode.SUBTRACT)


solid = Compound([part_1.part, body_2_1.part, body_3_1.part])
